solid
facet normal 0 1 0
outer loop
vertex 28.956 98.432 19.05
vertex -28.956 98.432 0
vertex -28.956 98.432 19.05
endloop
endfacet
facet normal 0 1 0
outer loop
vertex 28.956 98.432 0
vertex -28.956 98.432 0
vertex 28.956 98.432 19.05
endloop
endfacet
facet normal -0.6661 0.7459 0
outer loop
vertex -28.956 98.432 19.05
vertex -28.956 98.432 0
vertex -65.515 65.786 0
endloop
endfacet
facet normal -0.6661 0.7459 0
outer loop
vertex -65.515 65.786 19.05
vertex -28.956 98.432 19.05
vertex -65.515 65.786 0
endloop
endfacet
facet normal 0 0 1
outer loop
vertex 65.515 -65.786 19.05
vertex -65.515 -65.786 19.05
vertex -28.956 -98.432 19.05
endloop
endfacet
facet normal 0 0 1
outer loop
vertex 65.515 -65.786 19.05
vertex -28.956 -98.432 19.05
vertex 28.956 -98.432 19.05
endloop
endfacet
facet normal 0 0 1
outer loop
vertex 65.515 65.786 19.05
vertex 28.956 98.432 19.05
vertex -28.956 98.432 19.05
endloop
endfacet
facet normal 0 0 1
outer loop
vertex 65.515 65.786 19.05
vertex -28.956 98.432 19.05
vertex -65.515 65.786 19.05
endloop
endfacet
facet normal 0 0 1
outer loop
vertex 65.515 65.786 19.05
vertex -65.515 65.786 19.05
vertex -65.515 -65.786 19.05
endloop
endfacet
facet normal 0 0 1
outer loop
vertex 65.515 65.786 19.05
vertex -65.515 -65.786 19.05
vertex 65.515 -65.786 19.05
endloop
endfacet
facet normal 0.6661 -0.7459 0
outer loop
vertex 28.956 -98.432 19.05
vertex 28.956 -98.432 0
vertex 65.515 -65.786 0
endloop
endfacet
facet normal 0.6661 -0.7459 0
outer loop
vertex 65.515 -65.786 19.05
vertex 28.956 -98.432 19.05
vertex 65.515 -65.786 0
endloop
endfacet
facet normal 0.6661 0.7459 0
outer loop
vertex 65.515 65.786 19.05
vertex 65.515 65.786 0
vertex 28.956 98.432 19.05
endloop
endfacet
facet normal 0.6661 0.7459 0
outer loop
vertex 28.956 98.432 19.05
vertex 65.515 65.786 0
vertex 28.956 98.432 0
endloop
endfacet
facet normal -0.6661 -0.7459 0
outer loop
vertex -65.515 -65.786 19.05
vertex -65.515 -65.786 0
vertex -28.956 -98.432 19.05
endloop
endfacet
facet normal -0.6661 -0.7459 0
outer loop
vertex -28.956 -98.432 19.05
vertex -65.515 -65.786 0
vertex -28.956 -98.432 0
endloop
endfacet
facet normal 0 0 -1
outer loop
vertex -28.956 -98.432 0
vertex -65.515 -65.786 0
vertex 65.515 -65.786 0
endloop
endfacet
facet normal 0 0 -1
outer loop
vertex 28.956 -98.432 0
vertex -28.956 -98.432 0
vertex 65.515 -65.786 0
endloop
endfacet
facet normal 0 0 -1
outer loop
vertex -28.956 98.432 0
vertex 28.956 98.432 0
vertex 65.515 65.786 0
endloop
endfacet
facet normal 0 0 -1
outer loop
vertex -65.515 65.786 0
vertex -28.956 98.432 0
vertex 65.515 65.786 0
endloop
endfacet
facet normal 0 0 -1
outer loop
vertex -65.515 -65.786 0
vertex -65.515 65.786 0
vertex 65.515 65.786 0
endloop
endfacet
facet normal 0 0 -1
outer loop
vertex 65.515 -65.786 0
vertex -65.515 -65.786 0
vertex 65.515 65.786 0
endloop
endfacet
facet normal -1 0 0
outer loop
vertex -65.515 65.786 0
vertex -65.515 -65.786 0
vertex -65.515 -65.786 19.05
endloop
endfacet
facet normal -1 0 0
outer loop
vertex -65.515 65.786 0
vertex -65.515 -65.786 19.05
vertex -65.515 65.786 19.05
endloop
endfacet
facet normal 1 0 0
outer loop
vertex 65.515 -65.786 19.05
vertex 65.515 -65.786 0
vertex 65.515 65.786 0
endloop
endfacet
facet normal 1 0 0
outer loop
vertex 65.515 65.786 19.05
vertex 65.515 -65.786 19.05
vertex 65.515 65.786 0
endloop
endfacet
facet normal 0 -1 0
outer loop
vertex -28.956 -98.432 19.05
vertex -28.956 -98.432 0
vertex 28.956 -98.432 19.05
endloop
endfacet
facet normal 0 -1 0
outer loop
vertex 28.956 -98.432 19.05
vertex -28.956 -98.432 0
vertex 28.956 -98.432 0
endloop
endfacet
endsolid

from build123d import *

# Parameters (mm, degrees)
F0_W     = 57.912
F0_H     = 32.6462263381
F0_W_2   = 36.5589186821
F0_H_2   = 131.572
F1_DEPTH = 19.05


with BuildPart() as f1:
    # F0 (on Top) → F1 (new body)
    with BuildSketch(Plane.XY):
        with Locations((0, 82.109113169)):
            Rectangle(F0_W, F0_H)
        with Locations((-47.2354593411, 0)):
            Rectangle(F0_W_2, F0_H_2)
        Polygon((-28.956, 65.786), (-28.956, 98.4322263381), (-65.5149186821, 65.786), align=None)
        Rectangle(F0_W, F0_H_2)
        with Locations((47.2354593411, 0)):
            Rectangle(F0_W_2, F0_H_2)
        Polygon((65.5149186821, 65.786), (28.956, 98.4322263381), (28.956, 65.786), align=None)
        Polygon((65.5149186821, -65.786), (28.956, -65.786), (28.956, -98.4322263381), align=None)
        with Locations((0, -82.109113169)):
            Rectangle(F0_W, F0_H)
        Polygon((-28.956, -98.4322263381), (-28.956, -65.786), (-65.5149186821, -65.786), align=None)
    extrude(amount=F1_DEPTH)


solid = f1.part
